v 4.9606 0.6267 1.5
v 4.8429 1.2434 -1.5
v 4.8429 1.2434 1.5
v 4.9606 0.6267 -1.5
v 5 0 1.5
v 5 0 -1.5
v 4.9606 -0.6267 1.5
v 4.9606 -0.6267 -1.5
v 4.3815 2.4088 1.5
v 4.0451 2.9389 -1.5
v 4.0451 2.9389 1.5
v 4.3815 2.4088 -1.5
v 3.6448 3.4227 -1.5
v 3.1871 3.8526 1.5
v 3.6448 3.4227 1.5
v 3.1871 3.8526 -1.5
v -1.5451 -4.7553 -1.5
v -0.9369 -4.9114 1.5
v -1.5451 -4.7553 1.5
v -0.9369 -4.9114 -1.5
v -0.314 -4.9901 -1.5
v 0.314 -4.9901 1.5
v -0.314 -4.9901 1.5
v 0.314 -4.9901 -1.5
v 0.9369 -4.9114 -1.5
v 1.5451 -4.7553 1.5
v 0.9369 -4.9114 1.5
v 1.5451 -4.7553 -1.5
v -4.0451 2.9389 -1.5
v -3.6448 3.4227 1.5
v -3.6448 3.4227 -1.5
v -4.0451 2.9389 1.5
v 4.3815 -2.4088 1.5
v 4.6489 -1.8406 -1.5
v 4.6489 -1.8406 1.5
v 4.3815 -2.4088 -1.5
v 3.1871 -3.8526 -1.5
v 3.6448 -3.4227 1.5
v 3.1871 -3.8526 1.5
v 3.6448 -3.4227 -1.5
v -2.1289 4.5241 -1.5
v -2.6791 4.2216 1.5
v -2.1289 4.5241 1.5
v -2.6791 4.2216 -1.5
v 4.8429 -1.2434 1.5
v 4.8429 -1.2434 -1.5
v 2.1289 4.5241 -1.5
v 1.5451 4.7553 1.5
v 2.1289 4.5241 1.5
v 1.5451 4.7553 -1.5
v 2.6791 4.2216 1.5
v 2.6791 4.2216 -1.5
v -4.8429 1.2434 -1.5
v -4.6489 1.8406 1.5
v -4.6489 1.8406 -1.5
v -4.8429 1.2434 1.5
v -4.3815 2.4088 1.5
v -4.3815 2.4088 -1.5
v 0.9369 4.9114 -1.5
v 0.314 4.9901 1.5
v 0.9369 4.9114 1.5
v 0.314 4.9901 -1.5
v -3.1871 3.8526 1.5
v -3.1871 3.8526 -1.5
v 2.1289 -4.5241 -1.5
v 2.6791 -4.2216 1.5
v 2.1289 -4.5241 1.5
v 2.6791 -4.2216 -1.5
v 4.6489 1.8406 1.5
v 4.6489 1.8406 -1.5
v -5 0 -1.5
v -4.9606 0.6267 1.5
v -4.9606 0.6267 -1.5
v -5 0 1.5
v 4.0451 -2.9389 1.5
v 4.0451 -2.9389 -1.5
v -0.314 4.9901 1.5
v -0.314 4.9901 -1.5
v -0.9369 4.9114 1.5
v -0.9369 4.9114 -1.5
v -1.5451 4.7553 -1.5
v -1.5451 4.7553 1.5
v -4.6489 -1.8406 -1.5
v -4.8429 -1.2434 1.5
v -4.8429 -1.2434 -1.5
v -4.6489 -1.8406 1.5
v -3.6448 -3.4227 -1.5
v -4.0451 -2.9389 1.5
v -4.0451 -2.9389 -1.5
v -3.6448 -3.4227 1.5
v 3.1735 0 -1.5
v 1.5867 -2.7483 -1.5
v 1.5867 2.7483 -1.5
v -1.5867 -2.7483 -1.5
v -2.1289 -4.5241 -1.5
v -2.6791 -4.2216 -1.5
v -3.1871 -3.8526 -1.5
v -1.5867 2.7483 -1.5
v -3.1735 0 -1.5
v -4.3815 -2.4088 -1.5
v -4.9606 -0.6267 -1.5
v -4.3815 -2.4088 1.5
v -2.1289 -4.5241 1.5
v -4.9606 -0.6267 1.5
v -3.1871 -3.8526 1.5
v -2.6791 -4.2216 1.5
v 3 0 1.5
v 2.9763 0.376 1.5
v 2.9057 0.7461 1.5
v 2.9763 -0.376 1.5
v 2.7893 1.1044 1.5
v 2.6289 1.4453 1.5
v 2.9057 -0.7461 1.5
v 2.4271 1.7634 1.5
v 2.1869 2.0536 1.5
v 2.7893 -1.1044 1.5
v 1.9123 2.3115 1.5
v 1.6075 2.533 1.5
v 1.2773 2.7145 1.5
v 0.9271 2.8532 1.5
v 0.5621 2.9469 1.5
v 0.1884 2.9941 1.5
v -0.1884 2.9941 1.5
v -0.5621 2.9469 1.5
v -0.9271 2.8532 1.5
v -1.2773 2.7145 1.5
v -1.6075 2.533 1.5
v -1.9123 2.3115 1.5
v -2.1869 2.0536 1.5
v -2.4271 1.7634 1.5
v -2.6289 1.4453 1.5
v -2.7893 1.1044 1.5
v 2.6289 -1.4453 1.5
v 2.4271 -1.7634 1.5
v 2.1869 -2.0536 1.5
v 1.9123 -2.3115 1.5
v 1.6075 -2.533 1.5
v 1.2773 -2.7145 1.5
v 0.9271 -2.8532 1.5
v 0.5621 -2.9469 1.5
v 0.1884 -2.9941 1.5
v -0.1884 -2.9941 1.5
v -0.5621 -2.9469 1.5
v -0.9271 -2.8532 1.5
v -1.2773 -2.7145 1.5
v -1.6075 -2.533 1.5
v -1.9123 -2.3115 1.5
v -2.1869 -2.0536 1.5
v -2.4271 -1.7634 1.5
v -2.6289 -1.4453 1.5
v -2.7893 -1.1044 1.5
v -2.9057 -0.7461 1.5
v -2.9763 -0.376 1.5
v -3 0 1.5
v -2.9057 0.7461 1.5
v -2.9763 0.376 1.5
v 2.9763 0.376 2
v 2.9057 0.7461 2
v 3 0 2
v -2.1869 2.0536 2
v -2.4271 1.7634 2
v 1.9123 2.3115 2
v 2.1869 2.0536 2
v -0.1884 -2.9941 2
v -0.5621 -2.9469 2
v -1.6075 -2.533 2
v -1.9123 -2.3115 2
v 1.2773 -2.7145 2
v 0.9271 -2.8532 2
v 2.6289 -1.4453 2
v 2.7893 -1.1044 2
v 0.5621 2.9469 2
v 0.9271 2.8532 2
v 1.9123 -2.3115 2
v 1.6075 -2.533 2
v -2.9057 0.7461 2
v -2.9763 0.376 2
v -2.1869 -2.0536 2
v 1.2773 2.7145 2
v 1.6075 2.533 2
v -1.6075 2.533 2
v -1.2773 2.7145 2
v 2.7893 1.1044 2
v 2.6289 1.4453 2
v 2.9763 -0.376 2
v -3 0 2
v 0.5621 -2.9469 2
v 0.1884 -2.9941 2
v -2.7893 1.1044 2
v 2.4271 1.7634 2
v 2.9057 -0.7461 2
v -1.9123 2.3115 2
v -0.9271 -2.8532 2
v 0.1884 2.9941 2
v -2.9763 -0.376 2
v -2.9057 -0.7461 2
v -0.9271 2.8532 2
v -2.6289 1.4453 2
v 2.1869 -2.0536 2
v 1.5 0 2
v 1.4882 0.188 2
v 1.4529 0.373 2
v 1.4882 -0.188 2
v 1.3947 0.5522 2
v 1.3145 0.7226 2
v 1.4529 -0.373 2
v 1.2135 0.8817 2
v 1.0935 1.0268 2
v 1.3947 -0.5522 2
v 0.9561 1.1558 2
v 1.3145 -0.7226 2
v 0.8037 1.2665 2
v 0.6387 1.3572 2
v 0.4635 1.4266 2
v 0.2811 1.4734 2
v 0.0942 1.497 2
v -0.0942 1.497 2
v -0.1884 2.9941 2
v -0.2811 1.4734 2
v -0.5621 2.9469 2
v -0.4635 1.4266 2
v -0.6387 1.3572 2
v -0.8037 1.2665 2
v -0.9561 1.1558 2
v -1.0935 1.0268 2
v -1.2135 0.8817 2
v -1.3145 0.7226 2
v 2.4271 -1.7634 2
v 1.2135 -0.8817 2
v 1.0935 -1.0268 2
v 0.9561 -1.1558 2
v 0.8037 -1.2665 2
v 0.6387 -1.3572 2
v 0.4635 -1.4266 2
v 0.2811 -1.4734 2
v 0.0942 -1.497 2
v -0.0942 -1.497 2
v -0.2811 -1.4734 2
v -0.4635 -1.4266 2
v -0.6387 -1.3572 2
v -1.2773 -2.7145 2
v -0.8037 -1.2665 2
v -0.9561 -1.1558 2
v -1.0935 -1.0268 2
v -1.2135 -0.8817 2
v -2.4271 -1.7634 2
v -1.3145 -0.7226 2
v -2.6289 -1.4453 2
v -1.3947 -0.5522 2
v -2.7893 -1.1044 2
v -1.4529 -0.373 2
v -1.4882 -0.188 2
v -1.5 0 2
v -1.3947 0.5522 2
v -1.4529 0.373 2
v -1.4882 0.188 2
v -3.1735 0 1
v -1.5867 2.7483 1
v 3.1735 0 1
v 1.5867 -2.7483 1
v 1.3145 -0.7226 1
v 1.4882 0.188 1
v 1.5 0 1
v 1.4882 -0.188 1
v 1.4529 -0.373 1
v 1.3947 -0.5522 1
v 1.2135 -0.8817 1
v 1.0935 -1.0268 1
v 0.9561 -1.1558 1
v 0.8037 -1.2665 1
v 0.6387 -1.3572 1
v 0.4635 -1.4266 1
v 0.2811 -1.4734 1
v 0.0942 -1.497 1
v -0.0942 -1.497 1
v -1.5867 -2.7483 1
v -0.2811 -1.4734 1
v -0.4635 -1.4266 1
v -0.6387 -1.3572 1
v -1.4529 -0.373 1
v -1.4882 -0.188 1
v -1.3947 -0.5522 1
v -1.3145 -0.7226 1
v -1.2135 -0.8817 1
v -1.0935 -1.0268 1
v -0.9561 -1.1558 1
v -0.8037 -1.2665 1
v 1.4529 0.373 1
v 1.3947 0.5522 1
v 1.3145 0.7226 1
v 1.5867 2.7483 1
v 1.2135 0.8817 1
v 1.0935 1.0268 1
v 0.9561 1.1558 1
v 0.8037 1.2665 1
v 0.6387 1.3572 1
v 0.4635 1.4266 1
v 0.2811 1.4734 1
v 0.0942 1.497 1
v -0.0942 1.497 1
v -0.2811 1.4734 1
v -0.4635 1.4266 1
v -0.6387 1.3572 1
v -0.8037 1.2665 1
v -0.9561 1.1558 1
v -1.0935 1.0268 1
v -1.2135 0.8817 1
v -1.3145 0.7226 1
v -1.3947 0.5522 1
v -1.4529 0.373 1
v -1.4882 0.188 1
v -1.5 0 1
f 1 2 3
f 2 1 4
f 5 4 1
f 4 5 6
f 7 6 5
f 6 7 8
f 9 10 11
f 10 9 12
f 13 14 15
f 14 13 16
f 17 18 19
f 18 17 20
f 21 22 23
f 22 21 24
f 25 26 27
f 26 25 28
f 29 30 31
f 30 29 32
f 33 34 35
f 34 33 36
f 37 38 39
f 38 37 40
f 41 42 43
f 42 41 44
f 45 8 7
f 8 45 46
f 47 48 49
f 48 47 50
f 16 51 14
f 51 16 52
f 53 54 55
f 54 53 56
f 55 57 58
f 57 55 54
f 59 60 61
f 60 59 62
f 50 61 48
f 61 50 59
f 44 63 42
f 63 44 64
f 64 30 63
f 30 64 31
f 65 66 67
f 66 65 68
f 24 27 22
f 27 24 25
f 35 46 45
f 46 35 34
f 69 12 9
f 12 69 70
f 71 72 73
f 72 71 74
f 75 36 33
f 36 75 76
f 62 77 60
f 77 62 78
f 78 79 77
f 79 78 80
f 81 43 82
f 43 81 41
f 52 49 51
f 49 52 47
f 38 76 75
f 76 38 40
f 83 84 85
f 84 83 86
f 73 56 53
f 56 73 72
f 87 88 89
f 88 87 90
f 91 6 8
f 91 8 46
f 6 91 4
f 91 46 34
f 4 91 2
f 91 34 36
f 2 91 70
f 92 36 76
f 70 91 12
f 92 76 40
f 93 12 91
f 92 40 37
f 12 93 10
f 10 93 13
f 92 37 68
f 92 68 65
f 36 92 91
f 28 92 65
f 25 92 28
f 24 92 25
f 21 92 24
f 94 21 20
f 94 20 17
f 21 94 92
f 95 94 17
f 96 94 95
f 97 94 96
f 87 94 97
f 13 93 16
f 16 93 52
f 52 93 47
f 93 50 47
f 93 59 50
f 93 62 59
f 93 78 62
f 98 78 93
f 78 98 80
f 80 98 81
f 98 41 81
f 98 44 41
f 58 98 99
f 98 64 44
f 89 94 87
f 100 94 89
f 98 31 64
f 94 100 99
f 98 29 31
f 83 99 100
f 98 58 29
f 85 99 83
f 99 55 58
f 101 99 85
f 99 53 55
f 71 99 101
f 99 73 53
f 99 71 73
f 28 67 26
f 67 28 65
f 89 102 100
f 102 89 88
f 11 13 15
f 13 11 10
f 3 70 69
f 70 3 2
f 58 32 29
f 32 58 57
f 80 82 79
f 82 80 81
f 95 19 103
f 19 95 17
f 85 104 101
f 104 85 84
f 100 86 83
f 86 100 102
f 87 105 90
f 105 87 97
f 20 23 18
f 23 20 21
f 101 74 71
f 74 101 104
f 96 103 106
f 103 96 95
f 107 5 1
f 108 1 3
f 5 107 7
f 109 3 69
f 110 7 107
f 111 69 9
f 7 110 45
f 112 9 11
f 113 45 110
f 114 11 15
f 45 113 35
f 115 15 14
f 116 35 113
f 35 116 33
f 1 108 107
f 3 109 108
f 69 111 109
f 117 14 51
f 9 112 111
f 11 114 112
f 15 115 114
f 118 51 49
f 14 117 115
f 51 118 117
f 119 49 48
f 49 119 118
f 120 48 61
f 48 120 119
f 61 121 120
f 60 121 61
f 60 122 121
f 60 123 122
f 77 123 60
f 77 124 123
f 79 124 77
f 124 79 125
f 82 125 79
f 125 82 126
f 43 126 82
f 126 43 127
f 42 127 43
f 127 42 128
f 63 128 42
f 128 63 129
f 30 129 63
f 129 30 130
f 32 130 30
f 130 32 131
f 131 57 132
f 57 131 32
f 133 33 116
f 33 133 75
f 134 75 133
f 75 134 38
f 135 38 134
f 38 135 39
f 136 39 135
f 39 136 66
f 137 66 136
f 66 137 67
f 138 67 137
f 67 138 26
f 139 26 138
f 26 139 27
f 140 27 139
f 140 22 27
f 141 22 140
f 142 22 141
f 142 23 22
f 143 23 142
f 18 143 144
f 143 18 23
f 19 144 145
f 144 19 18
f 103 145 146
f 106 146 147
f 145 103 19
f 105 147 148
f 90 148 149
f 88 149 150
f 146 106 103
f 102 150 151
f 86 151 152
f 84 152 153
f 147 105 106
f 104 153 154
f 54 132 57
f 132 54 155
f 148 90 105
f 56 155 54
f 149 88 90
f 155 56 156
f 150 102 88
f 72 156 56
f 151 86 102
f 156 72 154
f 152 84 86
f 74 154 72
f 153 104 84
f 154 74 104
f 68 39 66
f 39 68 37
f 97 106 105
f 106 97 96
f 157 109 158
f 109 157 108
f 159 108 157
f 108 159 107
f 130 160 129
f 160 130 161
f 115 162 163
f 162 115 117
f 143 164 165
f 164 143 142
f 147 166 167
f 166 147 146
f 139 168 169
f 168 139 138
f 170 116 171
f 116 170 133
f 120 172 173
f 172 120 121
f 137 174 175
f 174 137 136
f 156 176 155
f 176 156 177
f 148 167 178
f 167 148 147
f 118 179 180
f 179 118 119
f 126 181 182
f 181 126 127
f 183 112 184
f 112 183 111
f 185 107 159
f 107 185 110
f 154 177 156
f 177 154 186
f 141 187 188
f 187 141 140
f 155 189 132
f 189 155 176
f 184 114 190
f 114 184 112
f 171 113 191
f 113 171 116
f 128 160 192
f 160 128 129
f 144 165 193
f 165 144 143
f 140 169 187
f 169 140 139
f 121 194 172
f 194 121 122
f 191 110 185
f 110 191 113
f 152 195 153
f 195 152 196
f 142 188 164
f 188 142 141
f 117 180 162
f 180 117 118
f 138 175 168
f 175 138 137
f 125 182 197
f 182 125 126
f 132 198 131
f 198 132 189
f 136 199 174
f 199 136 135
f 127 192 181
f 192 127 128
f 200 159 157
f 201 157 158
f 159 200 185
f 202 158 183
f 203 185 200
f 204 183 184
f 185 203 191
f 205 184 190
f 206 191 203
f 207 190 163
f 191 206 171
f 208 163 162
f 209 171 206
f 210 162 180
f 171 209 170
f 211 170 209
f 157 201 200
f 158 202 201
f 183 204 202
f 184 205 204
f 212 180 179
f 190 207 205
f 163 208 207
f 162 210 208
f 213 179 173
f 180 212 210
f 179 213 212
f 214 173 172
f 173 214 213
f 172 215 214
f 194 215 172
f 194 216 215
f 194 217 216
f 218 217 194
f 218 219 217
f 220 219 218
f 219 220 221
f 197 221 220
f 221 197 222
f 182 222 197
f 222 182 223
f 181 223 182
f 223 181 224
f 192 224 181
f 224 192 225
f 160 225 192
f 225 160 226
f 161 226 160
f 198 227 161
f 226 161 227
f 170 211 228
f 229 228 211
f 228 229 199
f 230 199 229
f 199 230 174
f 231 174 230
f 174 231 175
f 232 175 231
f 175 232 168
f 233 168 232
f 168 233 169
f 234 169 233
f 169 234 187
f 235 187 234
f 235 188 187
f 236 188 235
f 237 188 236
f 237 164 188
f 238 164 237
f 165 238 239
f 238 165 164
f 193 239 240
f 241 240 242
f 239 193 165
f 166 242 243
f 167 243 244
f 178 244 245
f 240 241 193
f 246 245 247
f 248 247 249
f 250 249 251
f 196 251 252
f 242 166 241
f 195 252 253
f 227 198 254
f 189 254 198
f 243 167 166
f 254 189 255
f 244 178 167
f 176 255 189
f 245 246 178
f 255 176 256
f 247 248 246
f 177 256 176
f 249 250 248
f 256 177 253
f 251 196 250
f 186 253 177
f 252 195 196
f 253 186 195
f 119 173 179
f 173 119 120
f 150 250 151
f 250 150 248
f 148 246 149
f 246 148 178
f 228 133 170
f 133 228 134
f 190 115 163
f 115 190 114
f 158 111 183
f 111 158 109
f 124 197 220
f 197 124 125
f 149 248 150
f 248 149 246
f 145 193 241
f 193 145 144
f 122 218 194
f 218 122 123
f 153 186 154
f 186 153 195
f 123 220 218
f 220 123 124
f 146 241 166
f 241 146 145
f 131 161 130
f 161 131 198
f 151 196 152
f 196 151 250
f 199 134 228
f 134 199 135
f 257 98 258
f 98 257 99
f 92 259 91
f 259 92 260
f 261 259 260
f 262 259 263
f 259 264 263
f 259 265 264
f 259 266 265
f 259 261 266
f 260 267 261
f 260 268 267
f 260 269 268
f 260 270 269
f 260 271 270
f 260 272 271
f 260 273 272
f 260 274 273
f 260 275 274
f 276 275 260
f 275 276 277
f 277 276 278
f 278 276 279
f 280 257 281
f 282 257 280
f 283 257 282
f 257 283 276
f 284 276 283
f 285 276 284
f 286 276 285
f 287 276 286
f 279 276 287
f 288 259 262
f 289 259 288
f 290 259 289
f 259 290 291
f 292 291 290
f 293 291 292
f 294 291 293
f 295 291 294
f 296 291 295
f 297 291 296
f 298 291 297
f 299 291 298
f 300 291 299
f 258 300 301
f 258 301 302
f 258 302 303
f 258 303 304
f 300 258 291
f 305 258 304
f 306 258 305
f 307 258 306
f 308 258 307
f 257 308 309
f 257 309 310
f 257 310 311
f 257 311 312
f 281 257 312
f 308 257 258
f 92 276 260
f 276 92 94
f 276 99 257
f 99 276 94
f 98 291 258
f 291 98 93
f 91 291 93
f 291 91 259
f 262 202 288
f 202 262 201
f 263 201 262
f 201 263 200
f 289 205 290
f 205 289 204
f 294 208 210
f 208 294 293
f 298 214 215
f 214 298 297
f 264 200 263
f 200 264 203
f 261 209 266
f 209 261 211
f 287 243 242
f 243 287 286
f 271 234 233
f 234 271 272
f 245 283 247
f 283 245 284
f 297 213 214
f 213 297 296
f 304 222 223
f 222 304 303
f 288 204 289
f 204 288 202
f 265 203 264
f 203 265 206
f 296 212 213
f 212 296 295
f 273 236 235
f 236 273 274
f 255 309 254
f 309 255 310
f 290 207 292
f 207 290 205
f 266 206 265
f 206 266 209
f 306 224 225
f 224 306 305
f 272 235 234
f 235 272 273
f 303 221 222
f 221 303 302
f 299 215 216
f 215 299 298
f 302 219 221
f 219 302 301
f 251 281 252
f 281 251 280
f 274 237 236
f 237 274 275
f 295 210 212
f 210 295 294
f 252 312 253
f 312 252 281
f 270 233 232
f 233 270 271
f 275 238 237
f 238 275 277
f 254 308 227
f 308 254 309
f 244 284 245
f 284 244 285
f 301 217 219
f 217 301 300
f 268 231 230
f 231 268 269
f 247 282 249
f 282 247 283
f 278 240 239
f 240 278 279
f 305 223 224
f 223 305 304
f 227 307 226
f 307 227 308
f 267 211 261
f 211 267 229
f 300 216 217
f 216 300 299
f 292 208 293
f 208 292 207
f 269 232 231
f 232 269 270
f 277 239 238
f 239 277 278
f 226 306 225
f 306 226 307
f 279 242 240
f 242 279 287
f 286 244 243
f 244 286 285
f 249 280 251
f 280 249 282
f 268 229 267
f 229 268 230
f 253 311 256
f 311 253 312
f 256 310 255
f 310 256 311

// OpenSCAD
$fn = 50;


difference() {
	union() {
		translate(v = [0, 0, -1.5000000000]) {
			cylinder(h = 3, r = 5.0000000000);
		}
		translate(v = [0, 0, -1.5000000000]) {
			cylinder(h = 3.5000000000, r = 3.0000000000);
		}
	}
	union() {
		translate(v = [0, 0, -1.5000000000]) {
			rotate(a = [0, 0, 0]) {
				difference() {
					union() {
						linear_extrude(height = 2.5000000000) {
							polygon(points = [[3.1735000000, 0.0000000000], [1.5867500000, 2.7483316189], [-1.5867500000, 2.7483316189], [-3.1735000000, 0.0000000000], [-1.5867500000, -2.7483316189], [1.5867500000, -2.7483316189]]);
						}
					}
					union();
				}
			}
		}
		translate(v = [0, 0, -100.0000000000]) {
			cylinder(h = 200, r = 1.5000000000);
		}
	}
}
